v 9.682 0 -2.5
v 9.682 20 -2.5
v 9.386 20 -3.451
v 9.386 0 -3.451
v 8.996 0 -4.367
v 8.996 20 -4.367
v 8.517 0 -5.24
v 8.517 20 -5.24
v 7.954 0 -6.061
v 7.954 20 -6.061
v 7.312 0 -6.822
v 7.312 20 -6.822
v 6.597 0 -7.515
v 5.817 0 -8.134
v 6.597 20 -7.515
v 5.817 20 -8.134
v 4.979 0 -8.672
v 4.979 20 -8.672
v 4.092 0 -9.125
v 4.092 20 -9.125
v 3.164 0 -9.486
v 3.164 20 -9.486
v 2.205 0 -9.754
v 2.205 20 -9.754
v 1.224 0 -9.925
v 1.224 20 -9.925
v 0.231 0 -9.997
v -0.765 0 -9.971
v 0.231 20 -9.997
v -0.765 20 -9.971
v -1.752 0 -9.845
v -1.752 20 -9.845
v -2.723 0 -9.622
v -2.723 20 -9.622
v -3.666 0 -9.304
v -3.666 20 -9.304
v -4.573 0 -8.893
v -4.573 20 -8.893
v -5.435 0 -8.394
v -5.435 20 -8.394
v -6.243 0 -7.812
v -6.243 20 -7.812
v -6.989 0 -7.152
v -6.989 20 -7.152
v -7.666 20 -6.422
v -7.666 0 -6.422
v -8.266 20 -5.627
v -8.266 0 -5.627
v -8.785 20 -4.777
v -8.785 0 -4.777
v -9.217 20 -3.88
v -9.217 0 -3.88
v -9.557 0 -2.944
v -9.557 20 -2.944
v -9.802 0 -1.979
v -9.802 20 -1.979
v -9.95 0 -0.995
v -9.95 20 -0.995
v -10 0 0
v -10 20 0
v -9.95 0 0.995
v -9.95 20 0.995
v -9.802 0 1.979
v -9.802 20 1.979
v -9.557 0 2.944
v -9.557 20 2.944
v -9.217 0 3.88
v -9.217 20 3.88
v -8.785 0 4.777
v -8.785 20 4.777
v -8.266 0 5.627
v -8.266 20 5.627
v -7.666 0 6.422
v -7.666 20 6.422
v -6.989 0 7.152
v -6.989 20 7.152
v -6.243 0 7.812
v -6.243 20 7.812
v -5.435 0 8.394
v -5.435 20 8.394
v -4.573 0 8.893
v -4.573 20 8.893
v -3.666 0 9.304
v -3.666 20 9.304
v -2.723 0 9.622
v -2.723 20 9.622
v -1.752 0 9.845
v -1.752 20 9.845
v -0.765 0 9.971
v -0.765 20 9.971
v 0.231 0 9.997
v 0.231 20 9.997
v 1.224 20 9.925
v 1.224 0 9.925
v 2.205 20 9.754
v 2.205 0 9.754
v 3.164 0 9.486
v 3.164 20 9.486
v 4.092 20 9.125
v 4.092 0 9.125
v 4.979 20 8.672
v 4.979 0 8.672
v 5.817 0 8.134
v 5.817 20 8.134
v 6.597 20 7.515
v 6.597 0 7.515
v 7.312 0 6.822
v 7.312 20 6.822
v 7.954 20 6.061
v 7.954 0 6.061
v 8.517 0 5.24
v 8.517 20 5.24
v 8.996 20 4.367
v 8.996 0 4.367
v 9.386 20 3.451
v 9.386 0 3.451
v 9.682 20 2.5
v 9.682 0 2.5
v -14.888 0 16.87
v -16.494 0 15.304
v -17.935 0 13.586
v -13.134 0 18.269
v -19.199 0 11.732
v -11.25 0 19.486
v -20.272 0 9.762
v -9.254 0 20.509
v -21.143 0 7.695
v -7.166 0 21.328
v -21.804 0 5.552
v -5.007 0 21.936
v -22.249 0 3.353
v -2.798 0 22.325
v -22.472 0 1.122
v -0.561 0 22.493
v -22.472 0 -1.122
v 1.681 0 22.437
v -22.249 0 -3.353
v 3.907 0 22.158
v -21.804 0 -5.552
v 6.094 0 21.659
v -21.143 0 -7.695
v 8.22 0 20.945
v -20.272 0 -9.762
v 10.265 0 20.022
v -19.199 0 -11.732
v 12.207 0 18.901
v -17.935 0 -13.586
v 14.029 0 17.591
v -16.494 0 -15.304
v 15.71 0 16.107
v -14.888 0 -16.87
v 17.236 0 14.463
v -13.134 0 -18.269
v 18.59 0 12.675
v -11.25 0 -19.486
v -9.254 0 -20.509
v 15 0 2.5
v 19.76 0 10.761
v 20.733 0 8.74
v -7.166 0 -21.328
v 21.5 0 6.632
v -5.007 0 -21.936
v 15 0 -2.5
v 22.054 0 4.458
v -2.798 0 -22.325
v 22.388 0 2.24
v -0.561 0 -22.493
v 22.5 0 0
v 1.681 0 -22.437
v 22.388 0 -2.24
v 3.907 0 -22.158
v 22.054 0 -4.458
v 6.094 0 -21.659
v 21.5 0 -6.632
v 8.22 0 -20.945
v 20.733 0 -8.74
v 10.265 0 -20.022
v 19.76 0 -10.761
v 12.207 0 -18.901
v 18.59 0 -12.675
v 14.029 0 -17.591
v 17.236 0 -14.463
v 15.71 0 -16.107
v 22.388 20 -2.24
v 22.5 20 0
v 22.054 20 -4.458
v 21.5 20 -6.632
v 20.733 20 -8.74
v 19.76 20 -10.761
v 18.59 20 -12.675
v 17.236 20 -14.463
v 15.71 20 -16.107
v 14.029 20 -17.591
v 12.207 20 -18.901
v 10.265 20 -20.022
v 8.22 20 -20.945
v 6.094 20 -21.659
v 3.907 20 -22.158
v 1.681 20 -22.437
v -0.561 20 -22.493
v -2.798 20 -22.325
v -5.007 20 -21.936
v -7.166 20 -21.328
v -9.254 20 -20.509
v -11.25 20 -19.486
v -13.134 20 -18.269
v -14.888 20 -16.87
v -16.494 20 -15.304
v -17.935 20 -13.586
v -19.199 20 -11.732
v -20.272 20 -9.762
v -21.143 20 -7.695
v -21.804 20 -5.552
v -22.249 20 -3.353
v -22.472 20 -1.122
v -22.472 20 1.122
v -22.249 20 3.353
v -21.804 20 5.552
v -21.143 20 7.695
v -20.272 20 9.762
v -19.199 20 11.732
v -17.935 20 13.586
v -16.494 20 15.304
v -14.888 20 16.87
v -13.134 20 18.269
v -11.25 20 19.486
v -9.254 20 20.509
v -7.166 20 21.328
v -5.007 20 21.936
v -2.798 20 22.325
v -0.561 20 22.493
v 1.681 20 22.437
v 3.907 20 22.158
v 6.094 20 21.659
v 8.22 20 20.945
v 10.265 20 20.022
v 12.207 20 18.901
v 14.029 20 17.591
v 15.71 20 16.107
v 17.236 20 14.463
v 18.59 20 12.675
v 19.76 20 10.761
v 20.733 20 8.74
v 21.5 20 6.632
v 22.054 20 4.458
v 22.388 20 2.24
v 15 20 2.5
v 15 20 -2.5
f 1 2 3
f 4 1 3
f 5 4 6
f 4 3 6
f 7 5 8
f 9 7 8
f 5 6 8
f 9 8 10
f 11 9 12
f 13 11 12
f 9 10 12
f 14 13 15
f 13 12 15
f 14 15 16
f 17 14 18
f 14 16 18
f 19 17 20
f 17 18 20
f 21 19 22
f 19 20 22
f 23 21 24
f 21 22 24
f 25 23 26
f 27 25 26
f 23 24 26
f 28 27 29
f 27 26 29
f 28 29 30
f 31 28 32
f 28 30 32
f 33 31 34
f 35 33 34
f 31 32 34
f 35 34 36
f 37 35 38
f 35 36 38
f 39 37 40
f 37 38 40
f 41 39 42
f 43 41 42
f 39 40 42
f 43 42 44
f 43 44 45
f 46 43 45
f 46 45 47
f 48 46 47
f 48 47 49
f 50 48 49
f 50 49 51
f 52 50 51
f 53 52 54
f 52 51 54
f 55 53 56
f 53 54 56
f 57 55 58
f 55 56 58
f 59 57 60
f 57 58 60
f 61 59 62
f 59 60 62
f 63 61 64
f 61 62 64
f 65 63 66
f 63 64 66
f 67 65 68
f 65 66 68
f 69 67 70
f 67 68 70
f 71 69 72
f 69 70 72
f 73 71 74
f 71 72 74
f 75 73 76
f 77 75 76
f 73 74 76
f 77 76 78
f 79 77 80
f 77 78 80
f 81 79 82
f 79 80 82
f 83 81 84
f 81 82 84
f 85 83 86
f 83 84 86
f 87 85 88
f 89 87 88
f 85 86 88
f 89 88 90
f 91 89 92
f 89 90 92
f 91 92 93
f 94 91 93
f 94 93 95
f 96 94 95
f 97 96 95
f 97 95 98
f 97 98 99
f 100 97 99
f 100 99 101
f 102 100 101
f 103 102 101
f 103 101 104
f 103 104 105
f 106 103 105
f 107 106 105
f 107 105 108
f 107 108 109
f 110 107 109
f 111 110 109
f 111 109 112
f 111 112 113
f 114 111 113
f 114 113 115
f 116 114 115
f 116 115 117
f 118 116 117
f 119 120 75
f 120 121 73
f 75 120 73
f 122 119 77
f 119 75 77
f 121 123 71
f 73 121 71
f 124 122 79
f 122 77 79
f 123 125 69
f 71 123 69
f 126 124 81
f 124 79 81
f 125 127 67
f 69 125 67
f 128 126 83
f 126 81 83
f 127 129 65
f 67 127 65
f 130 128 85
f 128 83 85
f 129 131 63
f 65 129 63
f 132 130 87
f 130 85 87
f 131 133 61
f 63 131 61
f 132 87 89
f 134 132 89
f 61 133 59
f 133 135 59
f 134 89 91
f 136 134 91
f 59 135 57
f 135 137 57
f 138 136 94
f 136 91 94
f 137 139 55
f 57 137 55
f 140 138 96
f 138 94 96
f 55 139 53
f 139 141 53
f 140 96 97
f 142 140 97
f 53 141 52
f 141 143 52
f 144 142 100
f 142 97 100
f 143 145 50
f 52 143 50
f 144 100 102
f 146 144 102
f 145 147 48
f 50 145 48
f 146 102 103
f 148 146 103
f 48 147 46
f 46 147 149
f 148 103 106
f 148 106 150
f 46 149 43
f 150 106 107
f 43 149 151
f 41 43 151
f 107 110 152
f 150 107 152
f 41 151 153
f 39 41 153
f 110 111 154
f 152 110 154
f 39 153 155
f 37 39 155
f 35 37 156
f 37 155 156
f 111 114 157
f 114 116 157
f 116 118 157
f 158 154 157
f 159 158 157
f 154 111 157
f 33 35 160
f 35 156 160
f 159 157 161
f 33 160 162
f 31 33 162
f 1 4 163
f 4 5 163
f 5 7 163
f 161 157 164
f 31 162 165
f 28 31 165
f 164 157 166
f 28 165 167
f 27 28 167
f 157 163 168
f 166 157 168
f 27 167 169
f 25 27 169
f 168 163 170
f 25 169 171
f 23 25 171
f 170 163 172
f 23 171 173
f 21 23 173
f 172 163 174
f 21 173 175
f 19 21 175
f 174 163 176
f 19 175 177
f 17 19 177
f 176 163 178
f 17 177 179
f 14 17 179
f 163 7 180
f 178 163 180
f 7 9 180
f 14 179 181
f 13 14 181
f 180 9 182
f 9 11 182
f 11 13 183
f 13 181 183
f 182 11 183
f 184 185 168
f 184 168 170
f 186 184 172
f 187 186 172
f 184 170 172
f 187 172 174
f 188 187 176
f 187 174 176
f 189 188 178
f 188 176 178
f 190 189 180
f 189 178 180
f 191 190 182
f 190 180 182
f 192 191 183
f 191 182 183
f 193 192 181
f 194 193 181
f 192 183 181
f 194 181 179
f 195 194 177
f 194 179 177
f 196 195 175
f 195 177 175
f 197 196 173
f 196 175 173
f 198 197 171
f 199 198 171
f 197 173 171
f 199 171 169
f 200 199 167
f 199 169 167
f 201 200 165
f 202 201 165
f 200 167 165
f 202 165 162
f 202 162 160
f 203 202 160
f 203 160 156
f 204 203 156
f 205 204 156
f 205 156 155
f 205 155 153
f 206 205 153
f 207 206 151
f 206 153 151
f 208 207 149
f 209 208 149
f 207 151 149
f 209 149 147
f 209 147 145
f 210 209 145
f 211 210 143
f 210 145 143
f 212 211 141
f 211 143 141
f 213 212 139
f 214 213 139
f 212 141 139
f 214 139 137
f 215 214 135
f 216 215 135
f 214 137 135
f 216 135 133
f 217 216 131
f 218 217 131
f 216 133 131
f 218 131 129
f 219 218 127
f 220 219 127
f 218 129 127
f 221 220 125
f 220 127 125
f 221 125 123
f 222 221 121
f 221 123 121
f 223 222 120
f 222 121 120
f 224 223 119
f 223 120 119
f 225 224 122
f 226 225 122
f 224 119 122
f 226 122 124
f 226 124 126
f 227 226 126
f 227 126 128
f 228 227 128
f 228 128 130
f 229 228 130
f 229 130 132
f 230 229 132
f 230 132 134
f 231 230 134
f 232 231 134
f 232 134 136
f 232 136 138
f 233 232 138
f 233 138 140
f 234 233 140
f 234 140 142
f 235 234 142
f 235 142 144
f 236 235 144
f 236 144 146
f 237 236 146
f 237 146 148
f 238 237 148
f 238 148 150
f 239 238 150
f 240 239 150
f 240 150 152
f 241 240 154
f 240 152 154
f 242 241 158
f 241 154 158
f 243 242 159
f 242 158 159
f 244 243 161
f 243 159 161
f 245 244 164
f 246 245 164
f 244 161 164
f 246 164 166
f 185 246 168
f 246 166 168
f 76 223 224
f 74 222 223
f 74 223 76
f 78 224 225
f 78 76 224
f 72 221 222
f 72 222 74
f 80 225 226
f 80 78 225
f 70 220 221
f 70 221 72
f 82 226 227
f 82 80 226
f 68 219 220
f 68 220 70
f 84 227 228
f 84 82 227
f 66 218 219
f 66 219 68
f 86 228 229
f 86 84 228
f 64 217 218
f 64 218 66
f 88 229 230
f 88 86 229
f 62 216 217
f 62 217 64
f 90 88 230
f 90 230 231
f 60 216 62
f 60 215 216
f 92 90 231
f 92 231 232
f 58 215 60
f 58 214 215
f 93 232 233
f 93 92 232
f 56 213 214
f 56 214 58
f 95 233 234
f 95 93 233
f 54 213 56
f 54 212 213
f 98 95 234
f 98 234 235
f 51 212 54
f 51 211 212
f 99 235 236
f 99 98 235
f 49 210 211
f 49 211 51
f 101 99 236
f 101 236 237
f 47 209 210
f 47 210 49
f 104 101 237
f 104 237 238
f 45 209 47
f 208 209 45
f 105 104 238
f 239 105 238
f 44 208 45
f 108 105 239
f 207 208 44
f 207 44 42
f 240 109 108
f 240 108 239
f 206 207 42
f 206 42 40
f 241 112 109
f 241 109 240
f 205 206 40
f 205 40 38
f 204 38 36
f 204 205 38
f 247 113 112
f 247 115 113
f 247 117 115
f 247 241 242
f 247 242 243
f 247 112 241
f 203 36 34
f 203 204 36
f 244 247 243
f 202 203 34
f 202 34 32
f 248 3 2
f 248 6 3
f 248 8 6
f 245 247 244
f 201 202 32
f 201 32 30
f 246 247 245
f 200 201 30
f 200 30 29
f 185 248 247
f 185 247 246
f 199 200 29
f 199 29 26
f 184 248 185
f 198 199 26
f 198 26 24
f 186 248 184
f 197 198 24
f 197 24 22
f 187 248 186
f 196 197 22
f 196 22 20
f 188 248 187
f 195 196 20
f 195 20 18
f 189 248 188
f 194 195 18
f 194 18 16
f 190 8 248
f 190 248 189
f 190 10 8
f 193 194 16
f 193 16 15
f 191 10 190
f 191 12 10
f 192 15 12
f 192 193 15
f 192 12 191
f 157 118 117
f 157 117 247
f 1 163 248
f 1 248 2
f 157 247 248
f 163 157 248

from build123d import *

# Parameters (mm, degrees)
SKETCH1_R           = 22.5
BOSS_EXTRUDE1_DEPTH = 20
CUT_EXTRUDE2_DEPTH  = 20


with BuildPart() as part:
    # Sketch1 → Boss-Extrude1 (new body)
    with BuildSketch(Plane(origin=(0, 0, 0), x_dir=(1, 0, 0), z_dir=(0, 1, 0))):
        Circle(SKETCH1_R)
    extrude(amount=BOSS_EXTRUDE1_DEPTH)

    # Sketch2 → Cut-Extrude2 (cut)
    with BuildSketch(Plane(origin=(0, 20, 0), x_dir=(1, 0, 0), z_dir=(0, 1, 0))):
        with BuildLine():
            Line((5, -2.5), (5, 2.5))
            Line((5, 2.5), (9.682458366, 2.5))
            ThreePointArc((9.682458366, 2.5), (-10, 0), (9.682458366, -2.5))
            Line((9.682458366, -2.5), (5, -2.5))
        make_face()
        with BuildLine():
            Line((9.682458366, 2.5), (5, 2.5))
            Line((5, 2.5), (5, -2.5))
            Line((5, -2.5), (9.682458366, -2.5))
            ThreePointArc((9.682458366, -2.5), (9.920296963, -1.260042925), (10, 0))
            ThreePointArc((10, 0), (9.920296963, 1.260042925), (9.682458366, 2.5))
        make_face()
        with BuildLine():
            Line((15, 2.5), (9.682458366, 2.5))
            ThreePointArc((9.682458366, 2.5), (9.920296963, 1.260042925), (10, 0))
            ThreePointArc((10, 0), (9.920296963, -1.260042925), (9.682458366, -2.5))
            Line((9.682458366, -2.5), (15, -2.5))
            Line((15, -2.5), (15, 2.5))
        make_face()
    extrude(amount=-CUT_EXTRUDE2_DEPTH, mode=Mode.SUBTRACT)


solid = part.part
